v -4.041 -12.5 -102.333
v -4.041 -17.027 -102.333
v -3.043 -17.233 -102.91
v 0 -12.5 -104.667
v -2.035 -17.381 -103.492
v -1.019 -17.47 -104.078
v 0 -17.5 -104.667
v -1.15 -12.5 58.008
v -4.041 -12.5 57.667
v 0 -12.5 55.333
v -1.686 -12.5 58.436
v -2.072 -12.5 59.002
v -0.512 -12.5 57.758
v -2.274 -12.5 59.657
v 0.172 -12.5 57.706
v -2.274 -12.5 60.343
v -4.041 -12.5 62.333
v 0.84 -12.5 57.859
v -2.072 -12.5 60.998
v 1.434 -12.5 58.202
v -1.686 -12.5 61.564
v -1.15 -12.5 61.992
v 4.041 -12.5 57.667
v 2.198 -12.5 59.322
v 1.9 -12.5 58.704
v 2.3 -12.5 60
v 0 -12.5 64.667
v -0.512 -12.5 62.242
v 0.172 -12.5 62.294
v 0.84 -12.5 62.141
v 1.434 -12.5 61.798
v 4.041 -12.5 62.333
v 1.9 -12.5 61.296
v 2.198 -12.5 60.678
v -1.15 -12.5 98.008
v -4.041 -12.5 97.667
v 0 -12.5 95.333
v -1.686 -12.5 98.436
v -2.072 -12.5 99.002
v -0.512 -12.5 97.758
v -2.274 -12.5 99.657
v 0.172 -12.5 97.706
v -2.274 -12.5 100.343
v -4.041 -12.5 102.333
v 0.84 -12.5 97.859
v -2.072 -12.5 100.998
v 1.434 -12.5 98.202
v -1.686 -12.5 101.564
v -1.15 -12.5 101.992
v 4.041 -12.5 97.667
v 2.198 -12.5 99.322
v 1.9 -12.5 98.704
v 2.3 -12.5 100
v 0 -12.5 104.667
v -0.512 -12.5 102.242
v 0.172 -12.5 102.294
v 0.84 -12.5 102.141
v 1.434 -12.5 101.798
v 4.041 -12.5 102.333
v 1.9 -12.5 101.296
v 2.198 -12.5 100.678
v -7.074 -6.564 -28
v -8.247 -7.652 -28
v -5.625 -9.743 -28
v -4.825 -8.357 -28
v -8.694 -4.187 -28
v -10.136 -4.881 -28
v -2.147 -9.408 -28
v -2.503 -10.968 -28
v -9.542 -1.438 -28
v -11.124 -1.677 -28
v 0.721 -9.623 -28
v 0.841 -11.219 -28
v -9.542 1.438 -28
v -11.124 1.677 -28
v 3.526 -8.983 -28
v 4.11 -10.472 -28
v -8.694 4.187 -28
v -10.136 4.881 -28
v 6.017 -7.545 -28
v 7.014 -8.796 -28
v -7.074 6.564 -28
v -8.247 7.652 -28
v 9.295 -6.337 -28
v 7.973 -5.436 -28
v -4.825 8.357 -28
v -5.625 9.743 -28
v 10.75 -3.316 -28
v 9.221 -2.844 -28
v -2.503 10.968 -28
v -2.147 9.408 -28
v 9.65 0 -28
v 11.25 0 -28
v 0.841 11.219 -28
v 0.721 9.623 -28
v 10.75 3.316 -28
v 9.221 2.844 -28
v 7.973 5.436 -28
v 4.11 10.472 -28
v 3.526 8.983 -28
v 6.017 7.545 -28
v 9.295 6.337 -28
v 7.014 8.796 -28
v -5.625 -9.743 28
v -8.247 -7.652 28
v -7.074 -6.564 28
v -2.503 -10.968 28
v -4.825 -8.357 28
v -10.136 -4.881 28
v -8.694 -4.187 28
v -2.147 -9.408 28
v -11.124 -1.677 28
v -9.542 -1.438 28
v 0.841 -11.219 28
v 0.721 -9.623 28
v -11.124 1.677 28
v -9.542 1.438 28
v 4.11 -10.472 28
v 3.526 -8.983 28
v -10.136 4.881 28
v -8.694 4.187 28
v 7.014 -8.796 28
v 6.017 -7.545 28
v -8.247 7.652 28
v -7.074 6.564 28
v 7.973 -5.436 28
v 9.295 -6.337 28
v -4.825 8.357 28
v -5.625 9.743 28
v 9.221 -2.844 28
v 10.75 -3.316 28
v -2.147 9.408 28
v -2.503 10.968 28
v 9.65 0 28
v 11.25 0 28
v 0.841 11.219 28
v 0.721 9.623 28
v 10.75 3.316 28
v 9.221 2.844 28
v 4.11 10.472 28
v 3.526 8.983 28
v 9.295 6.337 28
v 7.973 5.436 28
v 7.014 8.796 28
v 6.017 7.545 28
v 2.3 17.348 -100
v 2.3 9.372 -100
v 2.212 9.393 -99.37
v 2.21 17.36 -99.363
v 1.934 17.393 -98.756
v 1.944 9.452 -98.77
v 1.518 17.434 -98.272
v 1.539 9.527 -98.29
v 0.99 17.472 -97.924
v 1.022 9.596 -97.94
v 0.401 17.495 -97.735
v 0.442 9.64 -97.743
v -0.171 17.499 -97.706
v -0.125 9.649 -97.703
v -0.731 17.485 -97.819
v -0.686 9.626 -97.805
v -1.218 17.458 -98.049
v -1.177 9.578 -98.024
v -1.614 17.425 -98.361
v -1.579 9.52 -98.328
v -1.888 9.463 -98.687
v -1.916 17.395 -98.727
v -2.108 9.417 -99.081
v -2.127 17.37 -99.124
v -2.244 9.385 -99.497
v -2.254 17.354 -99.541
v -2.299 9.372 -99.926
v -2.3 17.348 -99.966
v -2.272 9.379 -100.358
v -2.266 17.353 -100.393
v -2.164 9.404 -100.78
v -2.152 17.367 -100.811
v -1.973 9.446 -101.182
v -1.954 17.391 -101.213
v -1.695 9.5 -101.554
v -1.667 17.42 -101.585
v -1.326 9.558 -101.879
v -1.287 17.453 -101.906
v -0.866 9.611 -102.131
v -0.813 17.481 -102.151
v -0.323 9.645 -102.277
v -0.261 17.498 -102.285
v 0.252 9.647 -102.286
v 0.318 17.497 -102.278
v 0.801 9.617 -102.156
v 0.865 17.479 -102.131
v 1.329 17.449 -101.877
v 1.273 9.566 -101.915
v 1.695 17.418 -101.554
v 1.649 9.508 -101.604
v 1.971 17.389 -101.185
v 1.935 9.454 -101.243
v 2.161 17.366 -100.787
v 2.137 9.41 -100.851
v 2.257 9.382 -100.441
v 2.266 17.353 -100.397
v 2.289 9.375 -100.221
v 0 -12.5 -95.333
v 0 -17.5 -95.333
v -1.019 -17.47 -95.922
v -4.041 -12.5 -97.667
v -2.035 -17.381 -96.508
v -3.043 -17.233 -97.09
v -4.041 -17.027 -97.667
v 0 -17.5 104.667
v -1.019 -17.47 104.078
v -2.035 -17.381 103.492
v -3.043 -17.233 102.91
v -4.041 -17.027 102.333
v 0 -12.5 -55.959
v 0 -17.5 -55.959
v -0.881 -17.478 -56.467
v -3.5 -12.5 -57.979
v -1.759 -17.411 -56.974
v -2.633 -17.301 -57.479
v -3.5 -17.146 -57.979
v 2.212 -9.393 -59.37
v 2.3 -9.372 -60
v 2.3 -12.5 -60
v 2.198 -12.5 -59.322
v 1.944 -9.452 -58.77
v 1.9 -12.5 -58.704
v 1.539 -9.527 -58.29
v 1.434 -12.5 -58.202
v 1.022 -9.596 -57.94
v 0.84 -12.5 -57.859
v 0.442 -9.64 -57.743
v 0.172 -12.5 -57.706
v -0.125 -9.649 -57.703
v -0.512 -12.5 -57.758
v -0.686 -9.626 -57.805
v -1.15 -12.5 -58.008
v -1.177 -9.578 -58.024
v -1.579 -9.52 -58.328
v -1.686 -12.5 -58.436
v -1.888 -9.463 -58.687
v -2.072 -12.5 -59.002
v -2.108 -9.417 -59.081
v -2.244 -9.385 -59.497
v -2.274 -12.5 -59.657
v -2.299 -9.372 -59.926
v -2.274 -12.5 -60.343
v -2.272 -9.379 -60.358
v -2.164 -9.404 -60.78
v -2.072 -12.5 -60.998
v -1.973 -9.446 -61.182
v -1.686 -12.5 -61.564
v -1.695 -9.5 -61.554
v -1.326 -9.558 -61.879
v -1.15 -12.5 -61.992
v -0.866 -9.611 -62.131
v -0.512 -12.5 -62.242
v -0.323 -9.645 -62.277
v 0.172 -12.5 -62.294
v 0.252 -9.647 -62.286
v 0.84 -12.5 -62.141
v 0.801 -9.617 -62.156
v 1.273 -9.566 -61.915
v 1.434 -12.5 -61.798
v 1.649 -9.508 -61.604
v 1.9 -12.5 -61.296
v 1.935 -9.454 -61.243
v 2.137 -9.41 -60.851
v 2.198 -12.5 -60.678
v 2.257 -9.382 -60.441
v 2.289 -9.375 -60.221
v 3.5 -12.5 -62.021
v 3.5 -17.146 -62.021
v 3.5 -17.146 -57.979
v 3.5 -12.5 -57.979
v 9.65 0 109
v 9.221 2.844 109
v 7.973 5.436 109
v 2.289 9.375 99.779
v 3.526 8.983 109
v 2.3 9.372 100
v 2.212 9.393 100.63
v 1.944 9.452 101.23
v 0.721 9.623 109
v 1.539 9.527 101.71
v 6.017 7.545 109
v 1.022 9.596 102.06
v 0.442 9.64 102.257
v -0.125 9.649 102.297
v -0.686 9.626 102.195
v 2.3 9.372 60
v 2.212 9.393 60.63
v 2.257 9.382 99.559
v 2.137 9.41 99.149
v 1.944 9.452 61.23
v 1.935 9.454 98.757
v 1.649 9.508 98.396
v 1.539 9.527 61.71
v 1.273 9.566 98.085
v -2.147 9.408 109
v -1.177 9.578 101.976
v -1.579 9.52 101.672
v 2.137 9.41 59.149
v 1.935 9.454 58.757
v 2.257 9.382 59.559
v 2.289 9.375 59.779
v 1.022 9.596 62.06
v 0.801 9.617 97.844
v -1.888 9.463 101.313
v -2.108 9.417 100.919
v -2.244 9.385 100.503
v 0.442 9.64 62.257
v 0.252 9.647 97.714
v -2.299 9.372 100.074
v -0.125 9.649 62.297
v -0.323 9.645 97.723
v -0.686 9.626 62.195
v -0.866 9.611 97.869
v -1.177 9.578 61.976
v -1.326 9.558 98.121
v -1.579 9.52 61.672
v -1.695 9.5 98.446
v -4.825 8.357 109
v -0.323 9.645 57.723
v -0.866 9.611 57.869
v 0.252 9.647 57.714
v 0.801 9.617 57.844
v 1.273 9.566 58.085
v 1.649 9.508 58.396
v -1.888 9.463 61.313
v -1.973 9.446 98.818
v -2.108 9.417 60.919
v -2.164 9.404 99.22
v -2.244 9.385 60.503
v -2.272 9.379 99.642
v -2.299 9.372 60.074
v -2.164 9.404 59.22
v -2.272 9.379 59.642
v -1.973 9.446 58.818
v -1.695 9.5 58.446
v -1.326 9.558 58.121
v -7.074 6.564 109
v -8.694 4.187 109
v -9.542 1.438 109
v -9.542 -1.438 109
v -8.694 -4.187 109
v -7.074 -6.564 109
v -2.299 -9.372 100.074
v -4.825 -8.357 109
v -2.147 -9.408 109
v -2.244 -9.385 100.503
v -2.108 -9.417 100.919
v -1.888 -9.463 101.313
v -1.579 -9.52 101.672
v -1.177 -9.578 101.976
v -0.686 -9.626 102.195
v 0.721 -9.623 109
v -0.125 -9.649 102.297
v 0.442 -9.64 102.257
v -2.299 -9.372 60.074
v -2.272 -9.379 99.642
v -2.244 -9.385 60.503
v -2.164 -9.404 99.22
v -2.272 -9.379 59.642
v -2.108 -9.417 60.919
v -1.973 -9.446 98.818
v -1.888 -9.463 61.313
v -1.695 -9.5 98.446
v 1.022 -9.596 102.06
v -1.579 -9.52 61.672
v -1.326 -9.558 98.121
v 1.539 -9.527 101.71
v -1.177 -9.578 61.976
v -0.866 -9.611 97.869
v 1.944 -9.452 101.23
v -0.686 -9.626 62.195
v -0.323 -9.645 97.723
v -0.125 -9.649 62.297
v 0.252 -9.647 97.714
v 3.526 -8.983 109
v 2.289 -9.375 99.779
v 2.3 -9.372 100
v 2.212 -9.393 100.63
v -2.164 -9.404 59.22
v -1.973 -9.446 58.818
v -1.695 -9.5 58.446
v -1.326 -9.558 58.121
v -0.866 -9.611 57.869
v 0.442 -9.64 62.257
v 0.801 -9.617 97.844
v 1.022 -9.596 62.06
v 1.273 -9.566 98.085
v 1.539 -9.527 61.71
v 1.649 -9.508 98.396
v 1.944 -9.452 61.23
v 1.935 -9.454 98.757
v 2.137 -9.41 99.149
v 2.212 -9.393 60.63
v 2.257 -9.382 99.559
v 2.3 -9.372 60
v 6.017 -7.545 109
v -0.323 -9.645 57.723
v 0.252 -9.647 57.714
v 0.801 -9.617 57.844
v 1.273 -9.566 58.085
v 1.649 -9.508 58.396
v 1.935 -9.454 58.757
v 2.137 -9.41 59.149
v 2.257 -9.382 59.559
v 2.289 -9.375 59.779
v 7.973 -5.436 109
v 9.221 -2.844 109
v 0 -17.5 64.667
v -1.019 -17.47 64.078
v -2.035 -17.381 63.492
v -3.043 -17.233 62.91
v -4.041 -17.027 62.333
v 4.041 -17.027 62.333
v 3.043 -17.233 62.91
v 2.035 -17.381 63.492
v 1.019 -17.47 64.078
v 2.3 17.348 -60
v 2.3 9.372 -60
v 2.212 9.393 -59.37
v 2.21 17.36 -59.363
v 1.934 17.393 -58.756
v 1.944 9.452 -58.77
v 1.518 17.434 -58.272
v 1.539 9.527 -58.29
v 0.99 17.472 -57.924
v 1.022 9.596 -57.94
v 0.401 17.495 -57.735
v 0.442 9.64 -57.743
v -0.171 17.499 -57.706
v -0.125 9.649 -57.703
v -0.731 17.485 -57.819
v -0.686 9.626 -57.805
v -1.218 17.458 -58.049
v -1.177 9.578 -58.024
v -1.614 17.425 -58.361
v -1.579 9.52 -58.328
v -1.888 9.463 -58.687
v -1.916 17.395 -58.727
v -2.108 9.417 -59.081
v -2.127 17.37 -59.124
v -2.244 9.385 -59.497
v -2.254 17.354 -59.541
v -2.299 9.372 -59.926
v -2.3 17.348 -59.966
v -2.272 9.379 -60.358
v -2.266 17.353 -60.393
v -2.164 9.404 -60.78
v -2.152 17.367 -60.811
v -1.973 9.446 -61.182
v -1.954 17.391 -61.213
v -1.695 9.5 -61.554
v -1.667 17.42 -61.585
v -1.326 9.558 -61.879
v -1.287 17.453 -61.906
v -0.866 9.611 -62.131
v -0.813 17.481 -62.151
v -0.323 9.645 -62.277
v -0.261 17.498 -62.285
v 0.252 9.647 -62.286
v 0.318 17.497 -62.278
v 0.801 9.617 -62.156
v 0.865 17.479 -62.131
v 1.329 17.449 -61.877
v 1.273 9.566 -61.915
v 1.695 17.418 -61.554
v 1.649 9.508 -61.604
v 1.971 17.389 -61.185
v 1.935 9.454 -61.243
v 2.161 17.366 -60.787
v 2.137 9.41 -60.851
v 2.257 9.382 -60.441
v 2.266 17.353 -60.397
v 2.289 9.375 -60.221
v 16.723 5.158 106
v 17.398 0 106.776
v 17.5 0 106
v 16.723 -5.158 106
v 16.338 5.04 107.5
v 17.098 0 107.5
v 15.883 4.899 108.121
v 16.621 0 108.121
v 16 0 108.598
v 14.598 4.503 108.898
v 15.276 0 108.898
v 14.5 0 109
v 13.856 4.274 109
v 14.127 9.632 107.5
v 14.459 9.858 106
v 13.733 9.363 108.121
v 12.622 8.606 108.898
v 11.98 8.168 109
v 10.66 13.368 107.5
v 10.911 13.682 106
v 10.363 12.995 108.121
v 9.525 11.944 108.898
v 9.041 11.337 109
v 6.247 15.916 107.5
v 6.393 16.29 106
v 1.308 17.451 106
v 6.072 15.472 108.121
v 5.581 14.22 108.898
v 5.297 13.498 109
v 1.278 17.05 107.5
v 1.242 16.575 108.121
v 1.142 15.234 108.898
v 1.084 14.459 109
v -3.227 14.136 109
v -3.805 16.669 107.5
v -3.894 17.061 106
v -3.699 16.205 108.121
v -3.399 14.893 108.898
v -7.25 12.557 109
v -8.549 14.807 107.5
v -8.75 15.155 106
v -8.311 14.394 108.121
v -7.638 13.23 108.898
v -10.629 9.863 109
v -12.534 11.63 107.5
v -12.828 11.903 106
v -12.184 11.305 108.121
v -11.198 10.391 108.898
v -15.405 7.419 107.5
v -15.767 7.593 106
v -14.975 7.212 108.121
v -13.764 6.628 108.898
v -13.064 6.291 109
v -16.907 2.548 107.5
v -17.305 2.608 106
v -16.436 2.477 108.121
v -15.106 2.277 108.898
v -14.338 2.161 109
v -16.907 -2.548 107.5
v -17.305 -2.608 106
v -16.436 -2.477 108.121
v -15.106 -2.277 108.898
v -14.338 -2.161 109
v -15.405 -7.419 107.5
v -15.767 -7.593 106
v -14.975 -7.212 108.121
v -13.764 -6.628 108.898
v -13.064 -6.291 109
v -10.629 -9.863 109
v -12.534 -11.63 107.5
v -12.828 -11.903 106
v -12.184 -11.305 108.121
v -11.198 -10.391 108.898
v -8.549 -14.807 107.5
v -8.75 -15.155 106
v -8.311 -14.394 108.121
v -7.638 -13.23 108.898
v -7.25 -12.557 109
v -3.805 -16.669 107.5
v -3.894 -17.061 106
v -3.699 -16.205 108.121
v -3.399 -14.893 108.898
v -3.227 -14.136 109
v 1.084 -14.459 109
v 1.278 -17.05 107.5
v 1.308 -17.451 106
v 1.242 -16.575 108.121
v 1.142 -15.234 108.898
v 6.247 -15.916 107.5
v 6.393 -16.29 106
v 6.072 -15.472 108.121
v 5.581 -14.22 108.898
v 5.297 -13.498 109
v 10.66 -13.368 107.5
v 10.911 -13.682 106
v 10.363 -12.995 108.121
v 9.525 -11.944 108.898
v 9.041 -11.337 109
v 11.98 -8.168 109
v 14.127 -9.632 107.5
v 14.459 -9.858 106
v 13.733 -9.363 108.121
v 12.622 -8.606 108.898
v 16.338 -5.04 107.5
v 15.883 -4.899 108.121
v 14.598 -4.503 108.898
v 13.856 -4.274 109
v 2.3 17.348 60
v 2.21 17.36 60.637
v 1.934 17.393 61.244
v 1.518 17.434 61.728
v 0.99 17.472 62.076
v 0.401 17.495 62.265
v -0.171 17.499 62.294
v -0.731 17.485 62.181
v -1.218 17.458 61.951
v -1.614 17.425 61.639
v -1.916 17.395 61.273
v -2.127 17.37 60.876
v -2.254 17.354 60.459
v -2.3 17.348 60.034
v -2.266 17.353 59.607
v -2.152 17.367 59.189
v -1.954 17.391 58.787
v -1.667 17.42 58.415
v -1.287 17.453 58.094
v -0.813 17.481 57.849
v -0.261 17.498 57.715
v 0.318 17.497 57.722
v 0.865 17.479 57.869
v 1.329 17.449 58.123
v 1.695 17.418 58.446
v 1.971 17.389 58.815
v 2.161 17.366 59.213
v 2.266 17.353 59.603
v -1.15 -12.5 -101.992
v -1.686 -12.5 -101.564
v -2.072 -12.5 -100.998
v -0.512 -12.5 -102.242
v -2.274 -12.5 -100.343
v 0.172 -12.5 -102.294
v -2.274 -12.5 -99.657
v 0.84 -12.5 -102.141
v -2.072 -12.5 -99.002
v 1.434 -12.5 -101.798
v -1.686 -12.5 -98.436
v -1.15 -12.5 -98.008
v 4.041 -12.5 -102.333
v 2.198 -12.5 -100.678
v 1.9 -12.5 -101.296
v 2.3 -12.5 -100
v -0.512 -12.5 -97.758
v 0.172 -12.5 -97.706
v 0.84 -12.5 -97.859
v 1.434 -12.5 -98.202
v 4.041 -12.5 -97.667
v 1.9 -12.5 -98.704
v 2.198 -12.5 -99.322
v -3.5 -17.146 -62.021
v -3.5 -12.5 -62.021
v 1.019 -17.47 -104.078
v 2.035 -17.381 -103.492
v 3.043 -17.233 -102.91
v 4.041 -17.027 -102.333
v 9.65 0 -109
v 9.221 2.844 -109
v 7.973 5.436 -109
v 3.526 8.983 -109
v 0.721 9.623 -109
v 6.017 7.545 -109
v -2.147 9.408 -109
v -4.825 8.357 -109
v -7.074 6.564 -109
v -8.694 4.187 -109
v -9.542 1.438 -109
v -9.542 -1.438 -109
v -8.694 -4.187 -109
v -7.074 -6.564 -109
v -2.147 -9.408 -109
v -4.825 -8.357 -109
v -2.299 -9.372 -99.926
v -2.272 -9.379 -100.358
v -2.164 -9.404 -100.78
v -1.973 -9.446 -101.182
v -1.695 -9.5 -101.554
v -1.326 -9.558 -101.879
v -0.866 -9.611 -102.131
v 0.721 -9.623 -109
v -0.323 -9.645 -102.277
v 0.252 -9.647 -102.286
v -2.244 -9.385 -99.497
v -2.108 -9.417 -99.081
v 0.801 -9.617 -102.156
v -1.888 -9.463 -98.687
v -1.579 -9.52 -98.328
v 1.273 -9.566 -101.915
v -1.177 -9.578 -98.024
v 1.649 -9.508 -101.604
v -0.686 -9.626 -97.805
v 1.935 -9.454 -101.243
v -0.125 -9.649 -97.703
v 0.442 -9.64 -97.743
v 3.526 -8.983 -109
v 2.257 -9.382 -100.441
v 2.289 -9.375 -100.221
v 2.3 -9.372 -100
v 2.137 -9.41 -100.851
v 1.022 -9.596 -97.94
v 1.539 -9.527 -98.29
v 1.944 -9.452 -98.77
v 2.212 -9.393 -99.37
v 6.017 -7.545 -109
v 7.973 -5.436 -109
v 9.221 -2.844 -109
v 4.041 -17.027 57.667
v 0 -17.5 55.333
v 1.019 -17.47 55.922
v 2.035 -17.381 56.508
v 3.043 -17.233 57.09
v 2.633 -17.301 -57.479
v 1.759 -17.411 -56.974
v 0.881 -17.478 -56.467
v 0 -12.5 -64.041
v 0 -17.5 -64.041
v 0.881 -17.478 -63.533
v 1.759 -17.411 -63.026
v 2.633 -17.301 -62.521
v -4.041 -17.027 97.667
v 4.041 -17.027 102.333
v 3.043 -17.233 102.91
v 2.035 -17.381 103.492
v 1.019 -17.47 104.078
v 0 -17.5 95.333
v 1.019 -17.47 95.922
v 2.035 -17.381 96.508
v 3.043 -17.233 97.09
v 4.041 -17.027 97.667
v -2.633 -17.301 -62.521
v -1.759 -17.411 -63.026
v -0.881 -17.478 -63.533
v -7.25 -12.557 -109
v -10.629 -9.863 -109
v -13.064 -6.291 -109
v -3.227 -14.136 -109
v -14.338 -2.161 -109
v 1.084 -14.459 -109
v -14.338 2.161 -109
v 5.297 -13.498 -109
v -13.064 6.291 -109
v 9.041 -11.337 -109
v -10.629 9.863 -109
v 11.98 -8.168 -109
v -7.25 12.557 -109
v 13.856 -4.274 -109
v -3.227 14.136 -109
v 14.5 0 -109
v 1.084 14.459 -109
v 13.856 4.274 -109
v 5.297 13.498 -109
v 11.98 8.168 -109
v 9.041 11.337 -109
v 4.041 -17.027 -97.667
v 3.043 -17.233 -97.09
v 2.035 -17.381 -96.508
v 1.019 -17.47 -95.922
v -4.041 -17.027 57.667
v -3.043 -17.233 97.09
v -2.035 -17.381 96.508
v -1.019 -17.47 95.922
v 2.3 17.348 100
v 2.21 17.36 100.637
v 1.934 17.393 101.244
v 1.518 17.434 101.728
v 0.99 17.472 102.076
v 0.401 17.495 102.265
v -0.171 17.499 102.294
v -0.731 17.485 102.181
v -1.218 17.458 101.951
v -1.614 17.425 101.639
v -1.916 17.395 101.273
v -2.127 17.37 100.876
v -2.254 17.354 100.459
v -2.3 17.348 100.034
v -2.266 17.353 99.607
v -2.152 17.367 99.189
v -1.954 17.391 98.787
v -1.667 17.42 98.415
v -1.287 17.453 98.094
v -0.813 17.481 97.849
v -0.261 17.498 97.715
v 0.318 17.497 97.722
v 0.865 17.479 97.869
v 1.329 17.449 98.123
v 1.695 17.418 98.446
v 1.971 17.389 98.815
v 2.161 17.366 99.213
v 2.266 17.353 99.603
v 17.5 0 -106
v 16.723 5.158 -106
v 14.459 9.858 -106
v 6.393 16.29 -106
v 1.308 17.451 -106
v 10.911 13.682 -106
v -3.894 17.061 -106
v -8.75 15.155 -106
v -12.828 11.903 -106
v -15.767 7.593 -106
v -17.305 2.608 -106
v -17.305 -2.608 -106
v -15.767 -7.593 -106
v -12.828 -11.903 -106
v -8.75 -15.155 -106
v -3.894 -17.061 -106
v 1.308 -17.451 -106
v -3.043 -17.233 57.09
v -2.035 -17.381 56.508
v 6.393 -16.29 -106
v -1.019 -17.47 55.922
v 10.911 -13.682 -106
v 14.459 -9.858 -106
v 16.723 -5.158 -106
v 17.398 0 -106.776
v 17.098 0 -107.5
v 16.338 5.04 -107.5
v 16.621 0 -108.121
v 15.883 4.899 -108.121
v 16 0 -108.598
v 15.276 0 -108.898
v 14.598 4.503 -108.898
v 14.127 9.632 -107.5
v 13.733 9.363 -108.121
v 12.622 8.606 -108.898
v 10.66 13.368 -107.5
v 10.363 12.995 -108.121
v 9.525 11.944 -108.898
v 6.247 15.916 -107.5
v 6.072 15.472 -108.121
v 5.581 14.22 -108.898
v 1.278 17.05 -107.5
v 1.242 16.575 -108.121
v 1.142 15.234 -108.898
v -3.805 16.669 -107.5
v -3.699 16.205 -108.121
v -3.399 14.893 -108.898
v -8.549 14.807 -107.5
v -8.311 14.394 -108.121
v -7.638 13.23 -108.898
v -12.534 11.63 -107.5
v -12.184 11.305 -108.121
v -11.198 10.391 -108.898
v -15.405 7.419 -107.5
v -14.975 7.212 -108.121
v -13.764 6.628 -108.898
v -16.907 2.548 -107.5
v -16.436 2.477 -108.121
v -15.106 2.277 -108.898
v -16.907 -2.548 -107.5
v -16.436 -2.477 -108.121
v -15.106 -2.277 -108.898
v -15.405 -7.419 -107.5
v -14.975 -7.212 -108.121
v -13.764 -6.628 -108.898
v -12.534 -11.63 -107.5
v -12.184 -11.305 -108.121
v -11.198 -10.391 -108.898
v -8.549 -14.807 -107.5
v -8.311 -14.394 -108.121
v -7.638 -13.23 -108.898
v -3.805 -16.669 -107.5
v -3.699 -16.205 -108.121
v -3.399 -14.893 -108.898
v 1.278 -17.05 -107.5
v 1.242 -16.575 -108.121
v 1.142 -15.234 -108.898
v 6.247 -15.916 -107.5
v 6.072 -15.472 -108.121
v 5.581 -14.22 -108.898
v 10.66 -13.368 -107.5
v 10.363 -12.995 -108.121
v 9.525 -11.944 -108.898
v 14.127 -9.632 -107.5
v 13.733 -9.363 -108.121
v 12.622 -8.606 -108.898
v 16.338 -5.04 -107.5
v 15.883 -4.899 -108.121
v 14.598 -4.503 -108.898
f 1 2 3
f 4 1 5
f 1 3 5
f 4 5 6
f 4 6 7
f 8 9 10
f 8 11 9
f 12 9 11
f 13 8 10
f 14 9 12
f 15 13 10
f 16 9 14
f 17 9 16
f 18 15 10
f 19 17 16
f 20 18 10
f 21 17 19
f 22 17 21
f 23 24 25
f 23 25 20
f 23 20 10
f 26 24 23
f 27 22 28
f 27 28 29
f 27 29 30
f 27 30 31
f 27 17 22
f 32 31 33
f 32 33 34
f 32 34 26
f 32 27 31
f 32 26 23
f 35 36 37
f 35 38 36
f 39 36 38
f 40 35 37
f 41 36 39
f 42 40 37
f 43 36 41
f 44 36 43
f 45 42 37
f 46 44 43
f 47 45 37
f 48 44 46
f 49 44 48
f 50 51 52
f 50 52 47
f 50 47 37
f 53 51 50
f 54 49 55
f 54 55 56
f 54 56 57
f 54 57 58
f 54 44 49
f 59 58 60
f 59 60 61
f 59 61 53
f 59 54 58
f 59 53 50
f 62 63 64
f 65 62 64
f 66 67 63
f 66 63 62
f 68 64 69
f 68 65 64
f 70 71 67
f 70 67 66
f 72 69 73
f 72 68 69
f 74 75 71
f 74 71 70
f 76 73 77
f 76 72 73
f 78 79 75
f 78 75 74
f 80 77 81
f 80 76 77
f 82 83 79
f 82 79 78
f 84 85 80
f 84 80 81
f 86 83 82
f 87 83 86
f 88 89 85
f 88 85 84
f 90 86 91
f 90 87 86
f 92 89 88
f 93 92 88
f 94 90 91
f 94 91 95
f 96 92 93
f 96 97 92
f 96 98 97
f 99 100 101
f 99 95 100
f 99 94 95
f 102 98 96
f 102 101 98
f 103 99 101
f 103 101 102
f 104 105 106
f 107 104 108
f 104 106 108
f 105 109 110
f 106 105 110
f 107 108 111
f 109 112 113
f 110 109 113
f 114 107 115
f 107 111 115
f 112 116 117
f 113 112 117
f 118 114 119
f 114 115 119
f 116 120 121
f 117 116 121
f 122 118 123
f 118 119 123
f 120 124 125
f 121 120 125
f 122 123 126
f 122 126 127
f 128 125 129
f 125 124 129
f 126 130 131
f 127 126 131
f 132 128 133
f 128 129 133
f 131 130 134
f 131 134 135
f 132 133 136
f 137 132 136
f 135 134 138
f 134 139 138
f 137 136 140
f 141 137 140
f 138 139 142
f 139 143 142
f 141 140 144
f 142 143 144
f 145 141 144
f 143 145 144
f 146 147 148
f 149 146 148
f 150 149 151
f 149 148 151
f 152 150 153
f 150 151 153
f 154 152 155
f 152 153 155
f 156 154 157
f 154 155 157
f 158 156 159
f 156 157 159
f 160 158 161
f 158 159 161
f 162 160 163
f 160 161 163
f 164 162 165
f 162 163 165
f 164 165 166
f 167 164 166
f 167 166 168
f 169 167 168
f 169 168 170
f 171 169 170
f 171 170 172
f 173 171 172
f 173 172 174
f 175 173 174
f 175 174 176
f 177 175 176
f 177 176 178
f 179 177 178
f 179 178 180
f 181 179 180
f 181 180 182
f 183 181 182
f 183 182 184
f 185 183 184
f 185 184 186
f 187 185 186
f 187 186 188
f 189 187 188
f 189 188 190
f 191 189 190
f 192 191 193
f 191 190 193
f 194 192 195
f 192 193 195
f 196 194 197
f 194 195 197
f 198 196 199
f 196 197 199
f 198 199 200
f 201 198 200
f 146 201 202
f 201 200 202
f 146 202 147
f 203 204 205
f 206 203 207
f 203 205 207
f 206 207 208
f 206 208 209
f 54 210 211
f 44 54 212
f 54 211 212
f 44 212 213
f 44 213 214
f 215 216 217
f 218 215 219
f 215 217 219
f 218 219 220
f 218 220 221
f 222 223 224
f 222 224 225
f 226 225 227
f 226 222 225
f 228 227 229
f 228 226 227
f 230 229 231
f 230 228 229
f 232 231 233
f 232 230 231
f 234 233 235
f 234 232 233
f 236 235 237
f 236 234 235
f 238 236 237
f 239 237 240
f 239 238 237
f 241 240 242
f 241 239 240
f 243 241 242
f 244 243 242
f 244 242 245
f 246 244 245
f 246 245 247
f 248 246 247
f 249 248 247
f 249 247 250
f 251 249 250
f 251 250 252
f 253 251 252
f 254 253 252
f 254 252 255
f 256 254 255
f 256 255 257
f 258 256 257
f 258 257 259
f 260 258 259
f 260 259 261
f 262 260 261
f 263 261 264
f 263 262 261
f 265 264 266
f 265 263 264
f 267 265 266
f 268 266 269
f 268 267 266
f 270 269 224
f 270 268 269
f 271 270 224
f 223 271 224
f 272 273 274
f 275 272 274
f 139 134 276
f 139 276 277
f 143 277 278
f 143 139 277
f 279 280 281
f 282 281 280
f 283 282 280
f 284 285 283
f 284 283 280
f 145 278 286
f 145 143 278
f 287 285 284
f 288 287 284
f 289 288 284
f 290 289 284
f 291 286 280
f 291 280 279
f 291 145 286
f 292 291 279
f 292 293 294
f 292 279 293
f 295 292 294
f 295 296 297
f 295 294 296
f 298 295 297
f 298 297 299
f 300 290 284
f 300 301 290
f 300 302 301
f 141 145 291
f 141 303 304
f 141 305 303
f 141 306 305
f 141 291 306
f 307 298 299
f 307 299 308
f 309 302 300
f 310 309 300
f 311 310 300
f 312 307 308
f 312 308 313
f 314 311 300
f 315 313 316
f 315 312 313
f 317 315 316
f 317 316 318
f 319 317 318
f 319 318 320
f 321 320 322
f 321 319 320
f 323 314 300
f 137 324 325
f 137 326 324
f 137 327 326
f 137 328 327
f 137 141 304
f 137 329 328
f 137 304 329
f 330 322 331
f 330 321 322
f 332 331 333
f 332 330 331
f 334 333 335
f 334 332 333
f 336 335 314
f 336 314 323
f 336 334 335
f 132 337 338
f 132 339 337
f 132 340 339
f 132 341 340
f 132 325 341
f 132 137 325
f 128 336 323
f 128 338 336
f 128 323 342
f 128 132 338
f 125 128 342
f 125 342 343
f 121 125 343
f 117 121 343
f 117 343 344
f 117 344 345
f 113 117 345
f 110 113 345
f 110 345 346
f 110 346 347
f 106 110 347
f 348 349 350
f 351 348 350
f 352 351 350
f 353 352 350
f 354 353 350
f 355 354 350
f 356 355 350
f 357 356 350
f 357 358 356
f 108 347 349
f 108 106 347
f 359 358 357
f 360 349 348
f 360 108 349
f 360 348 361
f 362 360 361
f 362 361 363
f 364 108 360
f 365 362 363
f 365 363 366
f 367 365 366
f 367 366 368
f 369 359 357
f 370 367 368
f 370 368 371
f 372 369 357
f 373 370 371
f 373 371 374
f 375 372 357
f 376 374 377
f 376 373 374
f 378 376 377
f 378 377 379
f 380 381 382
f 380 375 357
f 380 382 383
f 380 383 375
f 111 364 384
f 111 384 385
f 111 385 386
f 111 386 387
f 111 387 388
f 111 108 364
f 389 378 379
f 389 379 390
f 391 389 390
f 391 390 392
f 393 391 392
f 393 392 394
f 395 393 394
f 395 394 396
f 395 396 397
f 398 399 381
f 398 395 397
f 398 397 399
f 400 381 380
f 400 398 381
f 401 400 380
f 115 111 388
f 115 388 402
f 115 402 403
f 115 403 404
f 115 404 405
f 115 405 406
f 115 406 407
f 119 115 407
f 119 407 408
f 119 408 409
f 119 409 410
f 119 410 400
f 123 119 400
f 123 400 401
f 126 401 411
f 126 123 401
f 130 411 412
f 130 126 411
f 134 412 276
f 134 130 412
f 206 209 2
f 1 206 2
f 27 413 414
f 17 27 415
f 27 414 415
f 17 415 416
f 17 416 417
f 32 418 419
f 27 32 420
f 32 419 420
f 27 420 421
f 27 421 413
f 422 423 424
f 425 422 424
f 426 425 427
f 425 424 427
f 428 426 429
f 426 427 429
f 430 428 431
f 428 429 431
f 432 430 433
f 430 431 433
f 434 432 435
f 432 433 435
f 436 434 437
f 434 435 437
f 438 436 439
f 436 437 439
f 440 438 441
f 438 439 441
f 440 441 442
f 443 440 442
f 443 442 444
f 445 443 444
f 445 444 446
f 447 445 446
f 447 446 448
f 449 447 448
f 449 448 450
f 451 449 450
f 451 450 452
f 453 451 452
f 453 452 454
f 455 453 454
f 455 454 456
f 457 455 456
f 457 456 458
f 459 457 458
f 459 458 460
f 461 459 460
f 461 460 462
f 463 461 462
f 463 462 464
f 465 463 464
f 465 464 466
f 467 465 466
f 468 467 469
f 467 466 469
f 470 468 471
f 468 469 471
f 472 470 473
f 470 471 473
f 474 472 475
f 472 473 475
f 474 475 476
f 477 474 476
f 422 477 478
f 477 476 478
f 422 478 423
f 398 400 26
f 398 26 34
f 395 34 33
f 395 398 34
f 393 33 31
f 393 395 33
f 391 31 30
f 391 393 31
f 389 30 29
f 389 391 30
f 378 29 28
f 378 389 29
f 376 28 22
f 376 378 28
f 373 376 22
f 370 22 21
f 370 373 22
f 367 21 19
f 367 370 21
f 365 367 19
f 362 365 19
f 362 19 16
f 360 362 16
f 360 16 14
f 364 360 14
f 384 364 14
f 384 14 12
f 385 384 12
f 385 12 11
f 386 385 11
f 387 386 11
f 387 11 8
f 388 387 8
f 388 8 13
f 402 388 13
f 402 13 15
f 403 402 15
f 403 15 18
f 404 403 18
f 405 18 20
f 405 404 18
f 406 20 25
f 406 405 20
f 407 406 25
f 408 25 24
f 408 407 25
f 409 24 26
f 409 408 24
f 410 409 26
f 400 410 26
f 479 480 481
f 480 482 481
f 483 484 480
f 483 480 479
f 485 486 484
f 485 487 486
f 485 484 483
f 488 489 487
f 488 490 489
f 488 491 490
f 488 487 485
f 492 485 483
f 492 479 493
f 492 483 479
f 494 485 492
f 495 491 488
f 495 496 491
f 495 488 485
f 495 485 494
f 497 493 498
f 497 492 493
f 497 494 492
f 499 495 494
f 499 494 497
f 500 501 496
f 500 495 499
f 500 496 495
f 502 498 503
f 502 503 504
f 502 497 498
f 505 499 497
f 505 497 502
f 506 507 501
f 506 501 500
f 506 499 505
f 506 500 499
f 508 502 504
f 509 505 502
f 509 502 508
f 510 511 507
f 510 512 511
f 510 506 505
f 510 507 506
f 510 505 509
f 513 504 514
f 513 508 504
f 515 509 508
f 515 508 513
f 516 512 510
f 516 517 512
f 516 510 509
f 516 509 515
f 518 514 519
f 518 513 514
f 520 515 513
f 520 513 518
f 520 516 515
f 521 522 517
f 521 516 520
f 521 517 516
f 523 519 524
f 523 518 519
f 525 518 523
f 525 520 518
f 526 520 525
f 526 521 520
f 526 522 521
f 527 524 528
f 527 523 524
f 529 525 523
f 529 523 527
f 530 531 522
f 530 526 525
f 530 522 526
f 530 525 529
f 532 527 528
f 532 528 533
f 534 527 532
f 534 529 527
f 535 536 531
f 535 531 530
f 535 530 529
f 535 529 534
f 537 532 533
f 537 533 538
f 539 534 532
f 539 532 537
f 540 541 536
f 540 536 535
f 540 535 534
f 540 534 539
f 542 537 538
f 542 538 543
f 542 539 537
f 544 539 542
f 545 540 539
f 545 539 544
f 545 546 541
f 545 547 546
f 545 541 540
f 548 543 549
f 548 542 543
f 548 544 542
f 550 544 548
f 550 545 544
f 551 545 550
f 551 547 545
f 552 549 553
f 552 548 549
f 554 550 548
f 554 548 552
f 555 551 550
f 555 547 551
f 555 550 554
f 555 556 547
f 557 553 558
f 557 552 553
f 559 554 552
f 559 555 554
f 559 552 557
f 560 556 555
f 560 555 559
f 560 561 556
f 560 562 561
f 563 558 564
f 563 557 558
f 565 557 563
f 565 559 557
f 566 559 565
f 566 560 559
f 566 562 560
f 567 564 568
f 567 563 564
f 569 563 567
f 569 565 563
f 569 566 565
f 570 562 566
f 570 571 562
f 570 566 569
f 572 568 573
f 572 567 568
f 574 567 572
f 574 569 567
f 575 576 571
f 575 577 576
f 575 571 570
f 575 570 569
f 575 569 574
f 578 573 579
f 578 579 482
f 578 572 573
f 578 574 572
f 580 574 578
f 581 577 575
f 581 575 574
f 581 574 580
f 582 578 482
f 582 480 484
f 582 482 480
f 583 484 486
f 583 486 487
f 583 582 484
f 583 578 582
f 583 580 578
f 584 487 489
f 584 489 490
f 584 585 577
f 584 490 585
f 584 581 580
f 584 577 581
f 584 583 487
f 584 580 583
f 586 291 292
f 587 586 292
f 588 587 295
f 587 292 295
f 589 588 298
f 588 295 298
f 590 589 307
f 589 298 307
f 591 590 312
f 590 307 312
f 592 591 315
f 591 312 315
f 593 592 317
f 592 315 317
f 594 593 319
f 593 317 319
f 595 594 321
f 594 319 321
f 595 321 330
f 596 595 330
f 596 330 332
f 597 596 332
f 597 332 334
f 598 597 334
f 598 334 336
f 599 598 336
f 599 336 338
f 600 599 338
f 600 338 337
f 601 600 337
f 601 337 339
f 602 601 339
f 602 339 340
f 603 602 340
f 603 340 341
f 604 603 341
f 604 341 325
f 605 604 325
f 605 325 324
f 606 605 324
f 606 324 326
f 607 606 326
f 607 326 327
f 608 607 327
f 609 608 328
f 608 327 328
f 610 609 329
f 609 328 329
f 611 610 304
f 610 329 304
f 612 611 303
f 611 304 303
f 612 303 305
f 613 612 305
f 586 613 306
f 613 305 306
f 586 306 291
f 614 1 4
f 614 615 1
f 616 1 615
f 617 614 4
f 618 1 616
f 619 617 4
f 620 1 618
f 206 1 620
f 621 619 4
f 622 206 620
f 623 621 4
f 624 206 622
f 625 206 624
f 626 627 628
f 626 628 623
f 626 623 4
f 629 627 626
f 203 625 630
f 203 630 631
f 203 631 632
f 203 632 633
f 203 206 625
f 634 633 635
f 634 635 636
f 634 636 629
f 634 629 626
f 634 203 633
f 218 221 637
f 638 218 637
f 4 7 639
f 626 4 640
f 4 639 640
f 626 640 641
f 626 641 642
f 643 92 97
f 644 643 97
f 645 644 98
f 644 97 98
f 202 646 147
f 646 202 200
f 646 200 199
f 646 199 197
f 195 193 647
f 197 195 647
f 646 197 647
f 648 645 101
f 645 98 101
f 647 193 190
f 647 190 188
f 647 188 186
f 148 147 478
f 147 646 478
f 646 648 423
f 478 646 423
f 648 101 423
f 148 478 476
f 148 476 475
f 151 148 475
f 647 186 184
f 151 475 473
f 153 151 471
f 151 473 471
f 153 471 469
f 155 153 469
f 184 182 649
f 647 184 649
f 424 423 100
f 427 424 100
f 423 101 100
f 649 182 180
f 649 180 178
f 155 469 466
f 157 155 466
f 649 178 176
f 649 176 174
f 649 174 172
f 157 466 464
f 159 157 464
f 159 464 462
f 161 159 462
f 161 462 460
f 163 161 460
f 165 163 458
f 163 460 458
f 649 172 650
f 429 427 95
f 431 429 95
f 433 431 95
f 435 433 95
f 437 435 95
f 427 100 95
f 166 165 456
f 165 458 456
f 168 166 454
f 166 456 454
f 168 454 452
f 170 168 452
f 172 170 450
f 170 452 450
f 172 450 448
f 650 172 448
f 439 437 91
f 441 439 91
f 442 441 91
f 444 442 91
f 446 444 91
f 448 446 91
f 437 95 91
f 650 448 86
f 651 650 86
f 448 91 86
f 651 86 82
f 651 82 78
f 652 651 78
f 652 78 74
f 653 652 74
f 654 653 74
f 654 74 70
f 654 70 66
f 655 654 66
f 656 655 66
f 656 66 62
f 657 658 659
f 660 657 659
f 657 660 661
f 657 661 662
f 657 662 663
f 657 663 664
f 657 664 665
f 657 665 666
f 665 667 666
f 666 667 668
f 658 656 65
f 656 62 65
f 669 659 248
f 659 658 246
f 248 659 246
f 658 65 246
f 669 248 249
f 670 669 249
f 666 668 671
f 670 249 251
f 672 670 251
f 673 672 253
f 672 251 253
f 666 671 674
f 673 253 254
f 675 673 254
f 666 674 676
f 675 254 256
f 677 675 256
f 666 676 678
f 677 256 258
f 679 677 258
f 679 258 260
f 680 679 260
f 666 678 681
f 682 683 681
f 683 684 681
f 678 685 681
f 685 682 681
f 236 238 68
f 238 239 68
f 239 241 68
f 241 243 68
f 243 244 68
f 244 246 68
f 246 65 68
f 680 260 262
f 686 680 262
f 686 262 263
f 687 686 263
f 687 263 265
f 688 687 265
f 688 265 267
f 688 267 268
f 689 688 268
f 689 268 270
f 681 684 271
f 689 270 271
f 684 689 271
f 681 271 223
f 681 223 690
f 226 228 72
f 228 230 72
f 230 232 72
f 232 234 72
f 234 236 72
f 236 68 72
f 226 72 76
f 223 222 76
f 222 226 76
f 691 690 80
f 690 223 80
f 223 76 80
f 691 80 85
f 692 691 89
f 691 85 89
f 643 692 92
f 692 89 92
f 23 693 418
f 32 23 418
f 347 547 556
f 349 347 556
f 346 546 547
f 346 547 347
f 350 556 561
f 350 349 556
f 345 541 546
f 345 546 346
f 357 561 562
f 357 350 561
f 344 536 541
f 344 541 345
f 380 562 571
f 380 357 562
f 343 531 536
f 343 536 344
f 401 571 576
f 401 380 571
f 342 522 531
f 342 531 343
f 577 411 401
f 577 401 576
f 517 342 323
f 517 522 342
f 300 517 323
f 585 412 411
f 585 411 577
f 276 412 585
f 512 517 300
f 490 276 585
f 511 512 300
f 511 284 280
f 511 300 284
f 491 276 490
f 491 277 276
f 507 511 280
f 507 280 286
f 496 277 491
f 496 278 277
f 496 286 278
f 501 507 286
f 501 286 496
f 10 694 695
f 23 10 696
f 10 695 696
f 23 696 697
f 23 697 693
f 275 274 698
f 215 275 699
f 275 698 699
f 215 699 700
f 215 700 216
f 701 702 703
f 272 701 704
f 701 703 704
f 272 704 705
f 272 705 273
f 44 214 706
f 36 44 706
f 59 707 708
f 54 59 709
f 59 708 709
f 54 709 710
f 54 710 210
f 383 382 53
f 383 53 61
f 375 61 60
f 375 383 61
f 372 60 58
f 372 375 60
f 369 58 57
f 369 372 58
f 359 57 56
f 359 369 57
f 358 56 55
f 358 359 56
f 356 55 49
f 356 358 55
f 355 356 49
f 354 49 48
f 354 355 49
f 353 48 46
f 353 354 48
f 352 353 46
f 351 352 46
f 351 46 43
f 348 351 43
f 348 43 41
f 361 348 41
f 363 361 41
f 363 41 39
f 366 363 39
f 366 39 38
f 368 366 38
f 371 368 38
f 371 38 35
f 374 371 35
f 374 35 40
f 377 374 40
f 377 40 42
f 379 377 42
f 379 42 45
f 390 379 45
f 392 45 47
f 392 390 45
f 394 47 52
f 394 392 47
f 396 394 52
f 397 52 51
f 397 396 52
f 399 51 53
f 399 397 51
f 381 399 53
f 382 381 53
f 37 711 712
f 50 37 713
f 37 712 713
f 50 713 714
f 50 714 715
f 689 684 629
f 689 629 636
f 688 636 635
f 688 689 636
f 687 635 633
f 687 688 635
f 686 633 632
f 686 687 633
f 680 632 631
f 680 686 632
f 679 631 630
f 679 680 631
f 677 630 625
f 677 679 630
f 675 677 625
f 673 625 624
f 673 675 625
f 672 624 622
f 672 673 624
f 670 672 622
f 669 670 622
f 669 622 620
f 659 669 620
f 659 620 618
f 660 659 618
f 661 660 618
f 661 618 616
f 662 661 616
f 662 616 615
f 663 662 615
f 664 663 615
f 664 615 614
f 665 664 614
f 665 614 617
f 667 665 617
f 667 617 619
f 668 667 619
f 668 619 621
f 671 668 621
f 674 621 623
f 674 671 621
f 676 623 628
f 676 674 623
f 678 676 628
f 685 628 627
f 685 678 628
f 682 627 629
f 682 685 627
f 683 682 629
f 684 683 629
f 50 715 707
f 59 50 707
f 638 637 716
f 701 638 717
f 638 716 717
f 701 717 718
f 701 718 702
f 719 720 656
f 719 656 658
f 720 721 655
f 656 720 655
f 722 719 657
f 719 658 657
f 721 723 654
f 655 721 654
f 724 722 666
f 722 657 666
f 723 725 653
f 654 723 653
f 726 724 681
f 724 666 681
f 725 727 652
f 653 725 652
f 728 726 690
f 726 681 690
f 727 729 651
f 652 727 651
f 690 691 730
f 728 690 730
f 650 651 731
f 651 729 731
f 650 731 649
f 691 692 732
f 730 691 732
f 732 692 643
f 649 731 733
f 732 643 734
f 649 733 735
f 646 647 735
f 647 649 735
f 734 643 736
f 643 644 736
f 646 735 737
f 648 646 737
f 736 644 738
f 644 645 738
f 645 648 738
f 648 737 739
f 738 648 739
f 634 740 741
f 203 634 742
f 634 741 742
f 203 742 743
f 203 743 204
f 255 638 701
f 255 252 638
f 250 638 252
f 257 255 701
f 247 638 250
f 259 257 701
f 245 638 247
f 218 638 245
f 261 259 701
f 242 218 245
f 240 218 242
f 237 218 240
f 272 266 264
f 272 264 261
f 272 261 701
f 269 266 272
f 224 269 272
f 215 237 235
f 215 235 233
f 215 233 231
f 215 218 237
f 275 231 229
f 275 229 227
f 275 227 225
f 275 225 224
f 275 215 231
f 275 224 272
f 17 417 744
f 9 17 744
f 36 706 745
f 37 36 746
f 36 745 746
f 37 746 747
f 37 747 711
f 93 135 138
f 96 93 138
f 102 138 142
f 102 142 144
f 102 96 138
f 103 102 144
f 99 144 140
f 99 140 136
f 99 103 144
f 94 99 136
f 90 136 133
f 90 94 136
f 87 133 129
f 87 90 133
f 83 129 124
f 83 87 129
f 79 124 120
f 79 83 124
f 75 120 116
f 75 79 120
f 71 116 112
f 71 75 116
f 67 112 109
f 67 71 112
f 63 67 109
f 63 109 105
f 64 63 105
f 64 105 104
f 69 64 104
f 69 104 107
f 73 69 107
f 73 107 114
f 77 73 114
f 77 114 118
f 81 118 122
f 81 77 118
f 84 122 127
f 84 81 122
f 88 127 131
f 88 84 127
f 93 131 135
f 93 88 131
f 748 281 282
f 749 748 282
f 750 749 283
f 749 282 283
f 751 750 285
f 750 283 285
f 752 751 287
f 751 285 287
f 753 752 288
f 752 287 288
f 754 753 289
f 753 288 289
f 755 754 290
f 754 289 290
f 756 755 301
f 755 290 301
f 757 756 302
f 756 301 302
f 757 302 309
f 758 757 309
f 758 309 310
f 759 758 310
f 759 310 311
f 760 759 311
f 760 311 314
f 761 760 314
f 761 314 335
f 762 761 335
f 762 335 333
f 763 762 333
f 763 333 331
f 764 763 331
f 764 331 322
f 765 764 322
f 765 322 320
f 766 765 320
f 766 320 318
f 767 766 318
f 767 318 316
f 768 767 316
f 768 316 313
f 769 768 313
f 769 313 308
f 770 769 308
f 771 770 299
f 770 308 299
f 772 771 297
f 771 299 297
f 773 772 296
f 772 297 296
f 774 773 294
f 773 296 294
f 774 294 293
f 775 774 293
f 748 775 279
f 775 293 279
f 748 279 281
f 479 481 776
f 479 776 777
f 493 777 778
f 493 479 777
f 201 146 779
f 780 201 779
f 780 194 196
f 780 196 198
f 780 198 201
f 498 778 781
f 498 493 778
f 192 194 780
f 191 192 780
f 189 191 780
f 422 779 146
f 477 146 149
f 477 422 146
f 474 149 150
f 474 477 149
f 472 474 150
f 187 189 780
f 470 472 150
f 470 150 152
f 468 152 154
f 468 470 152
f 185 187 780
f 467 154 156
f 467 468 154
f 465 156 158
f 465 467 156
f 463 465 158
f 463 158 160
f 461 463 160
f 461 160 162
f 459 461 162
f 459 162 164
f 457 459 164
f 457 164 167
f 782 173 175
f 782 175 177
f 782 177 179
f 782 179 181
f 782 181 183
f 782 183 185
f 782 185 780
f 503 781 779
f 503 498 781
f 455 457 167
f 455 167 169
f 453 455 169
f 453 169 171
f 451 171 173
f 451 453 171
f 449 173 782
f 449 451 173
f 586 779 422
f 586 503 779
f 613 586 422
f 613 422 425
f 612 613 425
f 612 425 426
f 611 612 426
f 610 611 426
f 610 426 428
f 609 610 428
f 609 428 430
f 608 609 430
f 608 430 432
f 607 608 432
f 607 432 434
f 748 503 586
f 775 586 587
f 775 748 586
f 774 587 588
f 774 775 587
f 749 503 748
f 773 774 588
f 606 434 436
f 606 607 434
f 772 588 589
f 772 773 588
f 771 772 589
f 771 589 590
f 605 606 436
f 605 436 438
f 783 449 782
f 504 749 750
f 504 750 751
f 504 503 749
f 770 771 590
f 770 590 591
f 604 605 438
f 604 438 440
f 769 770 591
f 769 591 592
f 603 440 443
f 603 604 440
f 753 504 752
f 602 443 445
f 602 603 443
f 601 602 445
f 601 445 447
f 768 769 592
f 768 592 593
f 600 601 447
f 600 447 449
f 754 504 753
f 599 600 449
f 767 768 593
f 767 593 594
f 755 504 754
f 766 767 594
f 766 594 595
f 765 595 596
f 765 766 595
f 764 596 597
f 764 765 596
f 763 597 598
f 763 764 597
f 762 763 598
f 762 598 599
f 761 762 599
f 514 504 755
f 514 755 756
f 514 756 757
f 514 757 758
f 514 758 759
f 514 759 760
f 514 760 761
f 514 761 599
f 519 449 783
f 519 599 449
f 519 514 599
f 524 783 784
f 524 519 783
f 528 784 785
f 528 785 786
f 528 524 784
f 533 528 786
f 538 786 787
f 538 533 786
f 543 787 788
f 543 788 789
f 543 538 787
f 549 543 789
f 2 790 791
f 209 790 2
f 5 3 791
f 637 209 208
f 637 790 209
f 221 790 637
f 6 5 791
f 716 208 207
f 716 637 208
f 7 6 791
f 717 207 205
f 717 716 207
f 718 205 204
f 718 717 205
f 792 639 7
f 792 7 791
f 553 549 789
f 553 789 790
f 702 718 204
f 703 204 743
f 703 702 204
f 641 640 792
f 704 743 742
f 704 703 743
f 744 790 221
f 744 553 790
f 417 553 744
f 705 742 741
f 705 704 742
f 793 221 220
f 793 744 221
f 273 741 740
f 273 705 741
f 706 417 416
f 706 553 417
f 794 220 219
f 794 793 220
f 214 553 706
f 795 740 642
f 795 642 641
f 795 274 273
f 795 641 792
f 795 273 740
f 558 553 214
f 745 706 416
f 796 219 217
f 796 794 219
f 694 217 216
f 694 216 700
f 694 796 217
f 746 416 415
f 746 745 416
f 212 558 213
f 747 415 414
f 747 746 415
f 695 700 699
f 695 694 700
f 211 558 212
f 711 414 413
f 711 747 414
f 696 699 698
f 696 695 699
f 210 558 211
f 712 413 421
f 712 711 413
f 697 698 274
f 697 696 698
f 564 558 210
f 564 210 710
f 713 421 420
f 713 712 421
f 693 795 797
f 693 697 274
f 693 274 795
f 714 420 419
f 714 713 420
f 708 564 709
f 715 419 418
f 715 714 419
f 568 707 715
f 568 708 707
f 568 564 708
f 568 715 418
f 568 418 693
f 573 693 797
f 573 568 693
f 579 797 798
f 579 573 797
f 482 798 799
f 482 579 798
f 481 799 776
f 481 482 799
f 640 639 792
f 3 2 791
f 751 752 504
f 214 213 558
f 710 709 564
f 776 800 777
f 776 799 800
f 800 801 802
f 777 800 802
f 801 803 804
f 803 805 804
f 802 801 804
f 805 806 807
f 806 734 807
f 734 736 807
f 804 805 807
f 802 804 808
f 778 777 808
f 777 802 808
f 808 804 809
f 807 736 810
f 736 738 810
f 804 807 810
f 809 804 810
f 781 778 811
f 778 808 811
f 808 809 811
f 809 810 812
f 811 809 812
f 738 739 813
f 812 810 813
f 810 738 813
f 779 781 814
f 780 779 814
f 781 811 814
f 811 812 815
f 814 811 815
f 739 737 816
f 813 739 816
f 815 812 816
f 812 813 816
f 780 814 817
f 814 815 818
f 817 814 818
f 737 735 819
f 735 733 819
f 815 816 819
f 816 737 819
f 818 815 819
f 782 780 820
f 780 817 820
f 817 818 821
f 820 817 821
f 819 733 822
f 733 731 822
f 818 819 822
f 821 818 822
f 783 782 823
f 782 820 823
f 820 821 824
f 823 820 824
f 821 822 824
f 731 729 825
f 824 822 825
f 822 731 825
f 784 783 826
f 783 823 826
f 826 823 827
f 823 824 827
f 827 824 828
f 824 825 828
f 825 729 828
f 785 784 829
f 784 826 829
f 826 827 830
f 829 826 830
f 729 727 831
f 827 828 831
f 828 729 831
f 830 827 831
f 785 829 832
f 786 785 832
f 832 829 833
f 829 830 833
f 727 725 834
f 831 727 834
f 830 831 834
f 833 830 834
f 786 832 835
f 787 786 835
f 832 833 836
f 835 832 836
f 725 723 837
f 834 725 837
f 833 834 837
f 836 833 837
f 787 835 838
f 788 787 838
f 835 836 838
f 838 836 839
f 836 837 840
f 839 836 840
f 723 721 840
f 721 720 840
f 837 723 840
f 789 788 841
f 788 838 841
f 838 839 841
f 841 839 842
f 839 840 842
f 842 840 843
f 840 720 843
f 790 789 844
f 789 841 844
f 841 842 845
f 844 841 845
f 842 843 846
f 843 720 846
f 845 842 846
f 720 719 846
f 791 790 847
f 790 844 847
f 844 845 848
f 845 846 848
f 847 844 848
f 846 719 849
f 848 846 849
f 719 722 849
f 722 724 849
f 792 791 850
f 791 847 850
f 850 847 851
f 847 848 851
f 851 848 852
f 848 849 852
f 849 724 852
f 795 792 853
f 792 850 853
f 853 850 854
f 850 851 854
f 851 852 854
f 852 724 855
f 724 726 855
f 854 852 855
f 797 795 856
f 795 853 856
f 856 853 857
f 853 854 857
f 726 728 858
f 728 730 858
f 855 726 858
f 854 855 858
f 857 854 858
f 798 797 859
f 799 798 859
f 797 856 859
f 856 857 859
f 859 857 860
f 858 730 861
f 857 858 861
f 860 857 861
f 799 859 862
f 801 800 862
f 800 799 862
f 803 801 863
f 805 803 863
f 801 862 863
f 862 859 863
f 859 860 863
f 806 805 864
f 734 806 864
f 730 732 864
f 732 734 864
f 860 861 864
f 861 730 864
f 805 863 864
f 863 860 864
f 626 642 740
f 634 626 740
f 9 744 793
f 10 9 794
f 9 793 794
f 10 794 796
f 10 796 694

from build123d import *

# Parameters (mm, degrees)
SKETCH002_R          = 17.5
SKETCH002_R_2        = 9.65
PAD001_DEPTH         = 109
PAD001_DEPTH_BACK    = 109
SKETCH003_R          = 11.25
SKETCH003_R_2        = 6
POCKET001_DEPTH      = 28
POCKET001_DEPTH_BACK = 28
POCKET002_DEPTH      = 5
SKETCH005_R          = 2.3
POCKET003_DEPTH      = 50
POCKET003_DEPTH_BACK = 50
FILLET001_R          = 3


with BuildPart() as part:
    # Sketch002 → Pad001 (new body, two sides)
    with BuildSketch(Plane.XY) as pad001_sk:
        Circle(SKETCH002_R)
        Circle(SKETCH002_R_2, mode=Mode.SUBTRACT)
    extrude(amount=PAD001_DEPTH)
    extrude(pad001_sk.sketch, amount=-PAD001_DEPTH_BACK)

    # Sketch003 → Pocket001 (cut, two sides)
    with BuildSketch(Plane.XY) as pocket001_sk:
        Circle(SKETCH003_R)
        Circle(SKETCH003_R_2, mode=Mode.SUBTRACT)
    extrude(amount=-POCKET001_DEPTH, mode=Mode.SUBTRACT)
    extrude(pocket001_sk.sketch, amount=POCKET001_DEPTH_BACK, mode=Mode.SUBTRACT)

    # Sketch004 (on DatumPlane) → Pocket002 (cut)
    with BuildSketch(Plane.XZ.offset(17.5)):
        Polygon((0, 95.333333), (4.041452, 97.666667), (4.041452, 102.333333), (0, 104.666667), (-4.041452, 102.333333), (-4.041452, 97.666667), align=None)
        Polygon((4.041452, 57.666667), (4.041452, 62.333333), (0, 64.666667), (-4.041452, 62.333333), (-4.041452, 57.666667), (0, 55.333333), align=None)
        Polygon((0, -64.041452), (3.5, -62.020726), (3.5, -57.979274), (0, -55.958548), (-3.5, -57.979274), (-3.5, -62.020726), align=None)
        Polygon((4.041452, -102.333333), (4.041452, -97.666667), (0, -95.333333), (-4.041452, -97.666667), (-4.041452, -102.333333), (0, -104.666667), align=None)
    extrude(amount=-POCKET002_DEPTH, mode=Mode.SUBTRACT)

    # Sketch005 → Pocket003 (cut, two sides)
    with BuildSketch(Plane.XZ) as pocket003_sk:
        with Locations((0, 60)):
            Circle(SKETCH005_R)
        with Locations((0, 100)):
            Circle(SKETCH005_R)
        with Locations((0, -60)):
            Circle(SKETCH005_R)
        with Locations((0, -100)):
            Circle(SKETCH005_R)
    extrude(amount=-POCKET003_DEPTH, mode=Mode.SUBTRACT)
    extrude(pocket003_sk.sketch, amount=POCKET003_DEPTH_BACK, mode=Mode.SUBTRACT)

    # Fillet001
    fillet001_edges = [part.edges().sort_by_distance(p)[0] for p in [
        (-17.5, 0, 109),
        (-17.5, 0, -109),
    ]]
    fillet(fillet001_edges, radius=FILLET001_R)


solid = part.part
